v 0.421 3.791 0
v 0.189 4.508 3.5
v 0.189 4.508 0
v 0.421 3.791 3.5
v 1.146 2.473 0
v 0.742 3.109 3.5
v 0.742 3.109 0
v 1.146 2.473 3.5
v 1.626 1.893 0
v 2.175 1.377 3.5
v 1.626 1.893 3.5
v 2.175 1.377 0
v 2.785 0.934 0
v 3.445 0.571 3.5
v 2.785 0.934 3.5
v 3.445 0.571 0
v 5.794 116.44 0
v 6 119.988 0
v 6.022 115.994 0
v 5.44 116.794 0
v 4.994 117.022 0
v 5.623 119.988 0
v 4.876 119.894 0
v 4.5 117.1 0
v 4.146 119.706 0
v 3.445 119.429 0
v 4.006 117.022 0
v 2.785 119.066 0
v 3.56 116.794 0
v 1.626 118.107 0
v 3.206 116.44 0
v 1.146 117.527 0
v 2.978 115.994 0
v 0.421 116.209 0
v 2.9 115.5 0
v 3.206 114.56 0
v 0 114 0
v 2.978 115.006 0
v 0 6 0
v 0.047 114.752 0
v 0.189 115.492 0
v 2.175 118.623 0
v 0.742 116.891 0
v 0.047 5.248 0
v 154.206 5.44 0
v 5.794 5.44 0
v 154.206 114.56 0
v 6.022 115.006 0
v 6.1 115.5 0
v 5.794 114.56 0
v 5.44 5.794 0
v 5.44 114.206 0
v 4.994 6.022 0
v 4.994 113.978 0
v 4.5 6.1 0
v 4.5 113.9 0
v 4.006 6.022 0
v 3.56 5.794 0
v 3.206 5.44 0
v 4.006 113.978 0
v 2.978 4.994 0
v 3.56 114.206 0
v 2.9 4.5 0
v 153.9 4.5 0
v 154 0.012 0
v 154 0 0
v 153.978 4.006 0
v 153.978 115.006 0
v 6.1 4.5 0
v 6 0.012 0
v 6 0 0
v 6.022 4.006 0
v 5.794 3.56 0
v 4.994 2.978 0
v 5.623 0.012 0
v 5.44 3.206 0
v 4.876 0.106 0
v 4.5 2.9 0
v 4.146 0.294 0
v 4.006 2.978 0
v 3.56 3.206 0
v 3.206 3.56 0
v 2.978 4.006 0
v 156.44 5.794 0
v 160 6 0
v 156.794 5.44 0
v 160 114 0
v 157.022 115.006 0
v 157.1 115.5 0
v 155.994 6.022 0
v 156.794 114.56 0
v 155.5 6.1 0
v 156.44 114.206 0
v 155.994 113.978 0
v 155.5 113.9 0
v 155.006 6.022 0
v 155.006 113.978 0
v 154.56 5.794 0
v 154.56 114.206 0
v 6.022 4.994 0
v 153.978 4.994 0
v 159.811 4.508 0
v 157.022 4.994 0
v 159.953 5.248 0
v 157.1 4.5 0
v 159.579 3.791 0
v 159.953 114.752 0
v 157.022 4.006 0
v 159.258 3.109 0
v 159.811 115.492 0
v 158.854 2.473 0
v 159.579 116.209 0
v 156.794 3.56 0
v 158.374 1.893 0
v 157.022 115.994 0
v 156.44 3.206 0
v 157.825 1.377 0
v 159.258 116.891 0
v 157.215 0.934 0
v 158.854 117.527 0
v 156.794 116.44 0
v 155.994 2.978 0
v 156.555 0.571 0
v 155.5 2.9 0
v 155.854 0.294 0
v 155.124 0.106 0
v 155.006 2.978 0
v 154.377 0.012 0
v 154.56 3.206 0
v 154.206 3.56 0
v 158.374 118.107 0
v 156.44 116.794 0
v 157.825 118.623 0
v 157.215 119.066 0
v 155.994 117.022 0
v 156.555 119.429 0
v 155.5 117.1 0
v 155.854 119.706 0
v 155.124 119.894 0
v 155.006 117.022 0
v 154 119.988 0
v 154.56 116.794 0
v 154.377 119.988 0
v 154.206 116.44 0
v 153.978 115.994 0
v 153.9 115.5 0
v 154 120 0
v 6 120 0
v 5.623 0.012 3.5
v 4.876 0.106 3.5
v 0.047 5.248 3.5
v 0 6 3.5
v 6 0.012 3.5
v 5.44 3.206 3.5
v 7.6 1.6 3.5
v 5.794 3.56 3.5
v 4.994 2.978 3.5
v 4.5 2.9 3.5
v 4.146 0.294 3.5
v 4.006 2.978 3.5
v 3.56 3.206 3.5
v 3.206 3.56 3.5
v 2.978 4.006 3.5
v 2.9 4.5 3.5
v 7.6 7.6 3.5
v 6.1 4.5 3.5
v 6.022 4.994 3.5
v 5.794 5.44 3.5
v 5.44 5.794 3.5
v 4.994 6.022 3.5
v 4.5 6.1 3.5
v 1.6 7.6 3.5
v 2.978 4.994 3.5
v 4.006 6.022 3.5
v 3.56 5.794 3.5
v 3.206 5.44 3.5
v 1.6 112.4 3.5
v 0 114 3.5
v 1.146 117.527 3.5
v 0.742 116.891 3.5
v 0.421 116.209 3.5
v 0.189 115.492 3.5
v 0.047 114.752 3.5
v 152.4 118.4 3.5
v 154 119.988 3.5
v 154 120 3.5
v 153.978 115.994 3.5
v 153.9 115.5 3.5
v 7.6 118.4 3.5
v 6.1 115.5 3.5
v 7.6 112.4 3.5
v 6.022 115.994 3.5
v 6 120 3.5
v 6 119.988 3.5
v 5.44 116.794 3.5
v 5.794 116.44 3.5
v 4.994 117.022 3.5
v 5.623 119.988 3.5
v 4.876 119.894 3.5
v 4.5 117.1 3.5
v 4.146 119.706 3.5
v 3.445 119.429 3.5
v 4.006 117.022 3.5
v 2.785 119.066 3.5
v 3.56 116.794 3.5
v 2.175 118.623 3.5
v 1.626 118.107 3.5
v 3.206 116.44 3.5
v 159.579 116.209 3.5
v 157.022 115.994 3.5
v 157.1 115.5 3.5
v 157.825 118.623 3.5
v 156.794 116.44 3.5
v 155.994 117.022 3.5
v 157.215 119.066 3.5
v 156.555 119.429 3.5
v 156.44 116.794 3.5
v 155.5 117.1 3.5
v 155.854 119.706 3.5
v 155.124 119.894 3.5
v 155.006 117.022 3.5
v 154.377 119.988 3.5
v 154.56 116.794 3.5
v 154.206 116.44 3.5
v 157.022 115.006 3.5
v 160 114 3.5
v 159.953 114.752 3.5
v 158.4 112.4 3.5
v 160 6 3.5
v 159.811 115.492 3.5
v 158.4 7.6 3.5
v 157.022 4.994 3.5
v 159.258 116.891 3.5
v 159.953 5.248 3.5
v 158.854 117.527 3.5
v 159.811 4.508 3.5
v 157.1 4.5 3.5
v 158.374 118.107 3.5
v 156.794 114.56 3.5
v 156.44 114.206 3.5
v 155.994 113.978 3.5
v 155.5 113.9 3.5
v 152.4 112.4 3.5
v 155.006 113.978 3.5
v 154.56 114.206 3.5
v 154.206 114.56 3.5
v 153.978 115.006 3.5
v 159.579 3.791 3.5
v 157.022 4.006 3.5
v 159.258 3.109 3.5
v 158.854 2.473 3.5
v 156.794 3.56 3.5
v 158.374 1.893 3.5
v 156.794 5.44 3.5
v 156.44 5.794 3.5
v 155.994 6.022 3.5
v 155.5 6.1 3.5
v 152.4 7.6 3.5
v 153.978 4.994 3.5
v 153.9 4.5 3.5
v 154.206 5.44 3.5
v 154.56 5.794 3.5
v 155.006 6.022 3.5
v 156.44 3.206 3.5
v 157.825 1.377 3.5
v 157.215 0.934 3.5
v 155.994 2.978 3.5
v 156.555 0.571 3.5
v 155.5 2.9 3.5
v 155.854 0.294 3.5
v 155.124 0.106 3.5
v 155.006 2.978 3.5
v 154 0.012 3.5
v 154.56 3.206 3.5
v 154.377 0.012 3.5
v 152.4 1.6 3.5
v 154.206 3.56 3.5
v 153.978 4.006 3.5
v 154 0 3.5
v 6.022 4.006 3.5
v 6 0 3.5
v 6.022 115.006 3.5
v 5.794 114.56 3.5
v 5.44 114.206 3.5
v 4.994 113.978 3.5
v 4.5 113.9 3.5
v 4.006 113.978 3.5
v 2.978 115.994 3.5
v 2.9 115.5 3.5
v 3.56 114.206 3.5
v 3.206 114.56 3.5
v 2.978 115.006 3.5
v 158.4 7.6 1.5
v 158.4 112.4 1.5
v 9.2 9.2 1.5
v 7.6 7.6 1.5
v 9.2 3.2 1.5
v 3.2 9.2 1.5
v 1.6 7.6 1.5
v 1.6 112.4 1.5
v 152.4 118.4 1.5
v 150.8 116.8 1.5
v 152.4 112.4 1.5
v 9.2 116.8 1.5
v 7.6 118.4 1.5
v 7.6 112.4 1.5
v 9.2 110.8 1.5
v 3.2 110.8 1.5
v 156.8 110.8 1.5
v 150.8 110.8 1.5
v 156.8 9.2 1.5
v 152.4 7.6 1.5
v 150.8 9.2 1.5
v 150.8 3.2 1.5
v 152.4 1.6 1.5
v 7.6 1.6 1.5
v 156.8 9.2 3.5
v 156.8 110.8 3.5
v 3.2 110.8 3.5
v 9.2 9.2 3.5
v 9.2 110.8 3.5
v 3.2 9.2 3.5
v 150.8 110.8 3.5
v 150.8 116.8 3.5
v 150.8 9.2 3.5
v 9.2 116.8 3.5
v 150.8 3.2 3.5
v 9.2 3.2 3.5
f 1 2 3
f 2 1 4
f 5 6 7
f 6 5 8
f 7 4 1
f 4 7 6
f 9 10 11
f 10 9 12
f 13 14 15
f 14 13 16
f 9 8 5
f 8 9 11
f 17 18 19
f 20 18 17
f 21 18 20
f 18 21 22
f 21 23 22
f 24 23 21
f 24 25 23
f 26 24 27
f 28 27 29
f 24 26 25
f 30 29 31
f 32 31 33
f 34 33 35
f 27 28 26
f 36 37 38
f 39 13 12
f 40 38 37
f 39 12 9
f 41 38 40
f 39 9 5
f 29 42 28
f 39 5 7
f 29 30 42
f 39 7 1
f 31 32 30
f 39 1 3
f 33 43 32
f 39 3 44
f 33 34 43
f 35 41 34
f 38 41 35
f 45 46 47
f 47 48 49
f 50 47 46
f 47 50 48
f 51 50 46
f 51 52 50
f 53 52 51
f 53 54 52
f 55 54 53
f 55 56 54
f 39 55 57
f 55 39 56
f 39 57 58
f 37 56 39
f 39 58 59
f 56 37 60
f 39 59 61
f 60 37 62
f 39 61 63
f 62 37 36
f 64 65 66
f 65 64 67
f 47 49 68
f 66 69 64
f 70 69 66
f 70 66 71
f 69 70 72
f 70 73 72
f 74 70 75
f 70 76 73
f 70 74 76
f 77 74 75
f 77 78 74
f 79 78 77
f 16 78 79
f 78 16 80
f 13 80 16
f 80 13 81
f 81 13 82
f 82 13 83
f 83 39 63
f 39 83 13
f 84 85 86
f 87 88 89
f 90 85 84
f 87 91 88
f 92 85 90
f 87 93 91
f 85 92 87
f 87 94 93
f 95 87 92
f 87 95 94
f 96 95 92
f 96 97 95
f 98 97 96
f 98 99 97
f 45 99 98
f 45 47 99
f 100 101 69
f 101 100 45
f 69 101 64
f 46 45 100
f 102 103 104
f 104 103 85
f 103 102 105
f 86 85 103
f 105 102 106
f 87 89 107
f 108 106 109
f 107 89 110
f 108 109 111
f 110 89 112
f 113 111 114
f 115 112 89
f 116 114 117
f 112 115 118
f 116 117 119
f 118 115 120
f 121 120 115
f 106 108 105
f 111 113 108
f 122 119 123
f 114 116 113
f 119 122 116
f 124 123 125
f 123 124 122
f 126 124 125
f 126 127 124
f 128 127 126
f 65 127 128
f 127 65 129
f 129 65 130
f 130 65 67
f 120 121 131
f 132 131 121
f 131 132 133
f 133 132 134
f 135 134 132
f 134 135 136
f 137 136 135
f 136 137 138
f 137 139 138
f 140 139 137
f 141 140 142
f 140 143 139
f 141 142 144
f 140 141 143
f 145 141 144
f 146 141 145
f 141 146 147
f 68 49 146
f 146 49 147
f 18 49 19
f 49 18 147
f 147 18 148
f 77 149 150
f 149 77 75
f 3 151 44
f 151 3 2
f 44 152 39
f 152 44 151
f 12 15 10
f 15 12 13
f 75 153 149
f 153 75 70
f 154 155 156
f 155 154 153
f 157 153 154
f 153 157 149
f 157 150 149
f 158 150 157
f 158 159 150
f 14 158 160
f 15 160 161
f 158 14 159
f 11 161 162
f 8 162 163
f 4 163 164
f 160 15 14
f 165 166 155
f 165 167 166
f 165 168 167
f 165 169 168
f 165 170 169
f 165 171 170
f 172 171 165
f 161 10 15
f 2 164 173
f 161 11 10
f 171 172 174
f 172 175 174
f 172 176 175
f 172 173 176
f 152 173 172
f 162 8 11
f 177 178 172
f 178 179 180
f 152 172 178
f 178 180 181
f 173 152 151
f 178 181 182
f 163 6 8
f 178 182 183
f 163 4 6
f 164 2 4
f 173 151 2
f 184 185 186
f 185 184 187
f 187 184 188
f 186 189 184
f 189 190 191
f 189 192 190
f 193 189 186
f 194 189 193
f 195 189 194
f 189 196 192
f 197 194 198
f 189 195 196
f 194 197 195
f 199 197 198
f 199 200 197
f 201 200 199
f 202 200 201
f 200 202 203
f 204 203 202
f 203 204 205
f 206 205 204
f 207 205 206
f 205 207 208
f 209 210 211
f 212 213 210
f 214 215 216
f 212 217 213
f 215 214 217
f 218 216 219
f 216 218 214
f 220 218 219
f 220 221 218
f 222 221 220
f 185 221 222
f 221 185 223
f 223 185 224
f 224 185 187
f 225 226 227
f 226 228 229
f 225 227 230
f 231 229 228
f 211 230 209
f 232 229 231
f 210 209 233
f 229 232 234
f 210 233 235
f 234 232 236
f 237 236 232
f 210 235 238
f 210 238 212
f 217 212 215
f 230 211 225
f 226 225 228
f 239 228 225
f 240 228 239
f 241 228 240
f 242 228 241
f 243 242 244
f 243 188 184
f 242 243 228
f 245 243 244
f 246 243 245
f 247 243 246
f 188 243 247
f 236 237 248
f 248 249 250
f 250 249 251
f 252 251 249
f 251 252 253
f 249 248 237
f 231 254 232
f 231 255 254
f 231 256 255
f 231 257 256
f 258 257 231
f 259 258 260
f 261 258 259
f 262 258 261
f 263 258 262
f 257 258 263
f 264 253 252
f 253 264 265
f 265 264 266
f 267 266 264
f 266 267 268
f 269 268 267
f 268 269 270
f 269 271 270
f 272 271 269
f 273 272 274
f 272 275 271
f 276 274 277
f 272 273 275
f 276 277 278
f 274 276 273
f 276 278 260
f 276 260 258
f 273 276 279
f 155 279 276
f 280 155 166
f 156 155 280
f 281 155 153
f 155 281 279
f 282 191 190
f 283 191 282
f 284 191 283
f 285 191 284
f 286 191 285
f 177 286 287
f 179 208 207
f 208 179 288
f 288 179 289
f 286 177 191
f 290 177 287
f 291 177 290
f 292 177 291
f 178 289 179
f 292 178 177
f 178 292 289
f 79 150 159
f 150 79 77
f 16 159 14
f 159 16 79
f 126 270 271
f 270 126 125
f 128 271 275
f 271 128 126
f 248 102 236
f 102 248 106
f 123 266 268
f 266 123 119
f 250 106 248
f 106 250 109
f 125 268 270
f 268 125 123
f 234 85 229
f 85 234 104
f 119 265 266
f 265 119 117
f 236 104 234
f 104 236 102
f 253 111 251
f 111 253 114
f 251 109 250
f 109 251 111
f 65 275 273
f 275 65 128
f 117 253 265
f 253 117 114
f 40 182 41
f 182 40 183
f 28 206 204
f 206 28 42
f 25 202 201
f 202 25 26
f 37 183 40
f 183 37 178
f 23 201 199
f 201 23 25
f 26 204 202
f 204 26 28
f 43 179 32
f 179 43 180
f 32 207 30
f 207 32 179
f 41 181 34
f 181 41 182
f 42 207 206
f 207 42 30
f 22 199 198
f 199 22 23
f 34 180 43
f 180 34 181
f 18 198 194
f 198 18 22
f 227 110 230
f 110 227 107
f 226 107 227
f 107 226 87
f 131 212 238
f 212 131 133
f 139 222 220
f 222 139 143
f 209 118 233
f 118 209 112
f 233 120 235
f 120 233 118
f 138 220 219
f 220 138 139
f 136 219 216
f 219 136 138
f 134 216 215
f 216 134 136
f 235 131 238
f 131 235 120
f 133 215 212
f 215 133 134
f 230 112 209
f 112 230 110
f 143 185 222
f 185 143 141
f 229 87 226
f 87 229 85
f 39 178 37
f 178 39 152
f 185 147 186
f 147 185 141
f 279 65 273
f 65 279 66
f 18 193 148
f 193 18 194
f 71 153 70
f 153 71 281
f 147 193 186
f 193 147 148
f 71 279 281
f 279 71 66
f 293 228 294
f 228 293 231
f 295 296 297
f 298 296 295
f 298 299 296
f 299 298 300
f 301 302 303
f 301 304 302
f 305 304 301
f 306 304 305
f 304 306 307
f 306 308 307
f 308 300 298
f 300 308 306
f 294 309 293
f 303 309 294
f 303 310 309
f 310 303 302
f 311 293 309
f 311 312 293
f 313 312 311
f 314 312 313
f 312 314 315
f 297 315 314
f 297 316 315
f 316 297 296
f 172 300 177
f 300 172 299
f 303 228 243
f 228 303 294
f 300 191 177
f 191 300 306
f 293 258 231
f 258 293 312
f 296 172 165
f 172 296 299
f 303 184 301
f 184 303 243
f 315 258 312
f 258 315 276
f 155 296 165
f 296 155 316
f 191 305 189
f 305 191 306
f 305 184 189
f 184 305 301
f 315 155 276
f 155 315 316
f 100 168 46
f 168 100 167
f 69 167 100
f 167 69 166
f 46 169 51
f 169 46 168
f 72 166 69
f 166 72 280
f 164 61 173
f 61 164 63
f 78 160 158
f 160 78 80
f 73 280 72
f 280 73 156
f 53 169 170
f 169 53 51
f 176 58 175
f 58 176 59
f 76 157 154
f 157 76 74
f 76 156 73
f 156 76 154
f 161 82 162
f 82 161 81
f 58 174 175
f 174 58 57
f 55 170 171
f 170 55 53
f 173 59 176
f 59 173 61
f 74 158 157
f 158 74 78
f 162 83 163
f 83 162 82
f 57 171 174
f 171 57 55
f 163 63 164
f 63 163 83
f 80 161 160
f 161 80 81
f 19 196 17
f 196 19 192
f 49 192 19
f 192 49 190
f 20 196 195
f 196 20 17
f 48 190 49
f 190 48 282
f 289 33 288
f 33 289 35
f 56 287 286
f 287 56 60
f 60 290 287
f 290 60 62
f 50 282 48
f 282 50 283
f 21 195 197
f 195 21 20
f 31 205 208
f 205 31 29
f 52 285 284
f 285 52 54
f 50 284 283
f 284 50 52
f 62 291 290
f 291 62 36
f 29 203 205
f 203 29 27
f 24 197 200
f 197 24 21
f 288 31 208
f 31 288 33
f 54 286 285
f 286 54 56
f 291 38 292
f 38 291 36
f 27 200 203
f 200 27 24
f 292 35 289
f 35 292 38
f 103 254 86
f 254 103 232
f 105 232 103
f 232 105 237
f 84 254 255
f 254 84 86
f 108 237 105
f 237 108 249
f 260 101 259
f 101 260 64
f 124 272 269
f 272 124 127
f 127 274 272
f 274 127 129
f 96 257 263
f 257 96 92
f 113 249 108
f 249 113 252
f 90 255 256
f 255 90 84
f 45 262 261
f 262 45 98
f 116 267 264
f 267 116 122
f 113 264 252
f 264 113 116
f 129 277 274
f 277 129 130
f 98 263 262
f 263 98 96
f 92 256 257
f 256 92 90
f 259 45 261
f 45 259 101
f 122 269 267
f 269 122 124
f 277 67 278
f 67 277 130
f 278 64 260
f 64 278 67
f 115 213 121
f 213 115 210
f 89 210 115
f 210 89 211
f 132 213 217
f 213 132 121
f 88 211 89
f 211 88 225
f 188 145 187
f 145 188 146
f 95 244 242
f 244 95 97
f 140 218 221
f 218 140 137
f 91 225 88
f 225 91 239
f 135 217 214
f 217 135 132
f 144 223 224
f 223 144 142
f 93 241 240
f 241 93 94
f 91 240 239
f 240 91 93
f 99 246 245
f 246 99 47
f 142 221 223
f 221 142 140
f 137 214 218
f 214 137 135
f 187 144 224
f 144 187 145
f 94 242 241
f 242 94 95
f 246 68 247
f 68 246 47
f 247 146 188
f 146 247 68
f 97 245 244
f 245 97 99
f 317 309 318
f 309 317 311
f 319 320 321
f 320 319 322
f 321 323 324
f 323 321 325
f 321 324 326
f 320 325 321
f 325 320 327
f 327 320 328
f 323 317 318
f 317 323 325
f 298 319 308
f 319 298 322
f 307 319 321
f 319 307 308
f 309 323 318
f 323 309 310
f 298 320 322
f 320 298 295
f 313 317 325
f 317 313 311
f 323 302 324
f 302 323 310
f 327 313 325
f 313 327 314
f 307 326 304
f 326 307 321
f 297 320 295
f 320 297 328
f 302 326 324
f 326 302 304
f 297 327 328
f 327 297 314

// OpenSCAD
include <../../lib/box/box_waterproof.scad>;

waterproofBoxLid(
    boxSizeX=160,
    boxSizeY=120,
    boxInnerHeight=40,
    boxBottomTopThickness=1.5,
    boxScrewCornerRadius=6,
    boxScrewDiameter=3.2,
    boxWallThickness=3,
    barrierThickness=1.2,
    barrierHeight=2,
    barrierTolerance=0.2,
    screwnoseNumber=4,
    screwnoseDiameter=4,
    screwnoseHeight=5,
    screwnoseWallThickness=2.8,
    boxClearance = 0.1
);
